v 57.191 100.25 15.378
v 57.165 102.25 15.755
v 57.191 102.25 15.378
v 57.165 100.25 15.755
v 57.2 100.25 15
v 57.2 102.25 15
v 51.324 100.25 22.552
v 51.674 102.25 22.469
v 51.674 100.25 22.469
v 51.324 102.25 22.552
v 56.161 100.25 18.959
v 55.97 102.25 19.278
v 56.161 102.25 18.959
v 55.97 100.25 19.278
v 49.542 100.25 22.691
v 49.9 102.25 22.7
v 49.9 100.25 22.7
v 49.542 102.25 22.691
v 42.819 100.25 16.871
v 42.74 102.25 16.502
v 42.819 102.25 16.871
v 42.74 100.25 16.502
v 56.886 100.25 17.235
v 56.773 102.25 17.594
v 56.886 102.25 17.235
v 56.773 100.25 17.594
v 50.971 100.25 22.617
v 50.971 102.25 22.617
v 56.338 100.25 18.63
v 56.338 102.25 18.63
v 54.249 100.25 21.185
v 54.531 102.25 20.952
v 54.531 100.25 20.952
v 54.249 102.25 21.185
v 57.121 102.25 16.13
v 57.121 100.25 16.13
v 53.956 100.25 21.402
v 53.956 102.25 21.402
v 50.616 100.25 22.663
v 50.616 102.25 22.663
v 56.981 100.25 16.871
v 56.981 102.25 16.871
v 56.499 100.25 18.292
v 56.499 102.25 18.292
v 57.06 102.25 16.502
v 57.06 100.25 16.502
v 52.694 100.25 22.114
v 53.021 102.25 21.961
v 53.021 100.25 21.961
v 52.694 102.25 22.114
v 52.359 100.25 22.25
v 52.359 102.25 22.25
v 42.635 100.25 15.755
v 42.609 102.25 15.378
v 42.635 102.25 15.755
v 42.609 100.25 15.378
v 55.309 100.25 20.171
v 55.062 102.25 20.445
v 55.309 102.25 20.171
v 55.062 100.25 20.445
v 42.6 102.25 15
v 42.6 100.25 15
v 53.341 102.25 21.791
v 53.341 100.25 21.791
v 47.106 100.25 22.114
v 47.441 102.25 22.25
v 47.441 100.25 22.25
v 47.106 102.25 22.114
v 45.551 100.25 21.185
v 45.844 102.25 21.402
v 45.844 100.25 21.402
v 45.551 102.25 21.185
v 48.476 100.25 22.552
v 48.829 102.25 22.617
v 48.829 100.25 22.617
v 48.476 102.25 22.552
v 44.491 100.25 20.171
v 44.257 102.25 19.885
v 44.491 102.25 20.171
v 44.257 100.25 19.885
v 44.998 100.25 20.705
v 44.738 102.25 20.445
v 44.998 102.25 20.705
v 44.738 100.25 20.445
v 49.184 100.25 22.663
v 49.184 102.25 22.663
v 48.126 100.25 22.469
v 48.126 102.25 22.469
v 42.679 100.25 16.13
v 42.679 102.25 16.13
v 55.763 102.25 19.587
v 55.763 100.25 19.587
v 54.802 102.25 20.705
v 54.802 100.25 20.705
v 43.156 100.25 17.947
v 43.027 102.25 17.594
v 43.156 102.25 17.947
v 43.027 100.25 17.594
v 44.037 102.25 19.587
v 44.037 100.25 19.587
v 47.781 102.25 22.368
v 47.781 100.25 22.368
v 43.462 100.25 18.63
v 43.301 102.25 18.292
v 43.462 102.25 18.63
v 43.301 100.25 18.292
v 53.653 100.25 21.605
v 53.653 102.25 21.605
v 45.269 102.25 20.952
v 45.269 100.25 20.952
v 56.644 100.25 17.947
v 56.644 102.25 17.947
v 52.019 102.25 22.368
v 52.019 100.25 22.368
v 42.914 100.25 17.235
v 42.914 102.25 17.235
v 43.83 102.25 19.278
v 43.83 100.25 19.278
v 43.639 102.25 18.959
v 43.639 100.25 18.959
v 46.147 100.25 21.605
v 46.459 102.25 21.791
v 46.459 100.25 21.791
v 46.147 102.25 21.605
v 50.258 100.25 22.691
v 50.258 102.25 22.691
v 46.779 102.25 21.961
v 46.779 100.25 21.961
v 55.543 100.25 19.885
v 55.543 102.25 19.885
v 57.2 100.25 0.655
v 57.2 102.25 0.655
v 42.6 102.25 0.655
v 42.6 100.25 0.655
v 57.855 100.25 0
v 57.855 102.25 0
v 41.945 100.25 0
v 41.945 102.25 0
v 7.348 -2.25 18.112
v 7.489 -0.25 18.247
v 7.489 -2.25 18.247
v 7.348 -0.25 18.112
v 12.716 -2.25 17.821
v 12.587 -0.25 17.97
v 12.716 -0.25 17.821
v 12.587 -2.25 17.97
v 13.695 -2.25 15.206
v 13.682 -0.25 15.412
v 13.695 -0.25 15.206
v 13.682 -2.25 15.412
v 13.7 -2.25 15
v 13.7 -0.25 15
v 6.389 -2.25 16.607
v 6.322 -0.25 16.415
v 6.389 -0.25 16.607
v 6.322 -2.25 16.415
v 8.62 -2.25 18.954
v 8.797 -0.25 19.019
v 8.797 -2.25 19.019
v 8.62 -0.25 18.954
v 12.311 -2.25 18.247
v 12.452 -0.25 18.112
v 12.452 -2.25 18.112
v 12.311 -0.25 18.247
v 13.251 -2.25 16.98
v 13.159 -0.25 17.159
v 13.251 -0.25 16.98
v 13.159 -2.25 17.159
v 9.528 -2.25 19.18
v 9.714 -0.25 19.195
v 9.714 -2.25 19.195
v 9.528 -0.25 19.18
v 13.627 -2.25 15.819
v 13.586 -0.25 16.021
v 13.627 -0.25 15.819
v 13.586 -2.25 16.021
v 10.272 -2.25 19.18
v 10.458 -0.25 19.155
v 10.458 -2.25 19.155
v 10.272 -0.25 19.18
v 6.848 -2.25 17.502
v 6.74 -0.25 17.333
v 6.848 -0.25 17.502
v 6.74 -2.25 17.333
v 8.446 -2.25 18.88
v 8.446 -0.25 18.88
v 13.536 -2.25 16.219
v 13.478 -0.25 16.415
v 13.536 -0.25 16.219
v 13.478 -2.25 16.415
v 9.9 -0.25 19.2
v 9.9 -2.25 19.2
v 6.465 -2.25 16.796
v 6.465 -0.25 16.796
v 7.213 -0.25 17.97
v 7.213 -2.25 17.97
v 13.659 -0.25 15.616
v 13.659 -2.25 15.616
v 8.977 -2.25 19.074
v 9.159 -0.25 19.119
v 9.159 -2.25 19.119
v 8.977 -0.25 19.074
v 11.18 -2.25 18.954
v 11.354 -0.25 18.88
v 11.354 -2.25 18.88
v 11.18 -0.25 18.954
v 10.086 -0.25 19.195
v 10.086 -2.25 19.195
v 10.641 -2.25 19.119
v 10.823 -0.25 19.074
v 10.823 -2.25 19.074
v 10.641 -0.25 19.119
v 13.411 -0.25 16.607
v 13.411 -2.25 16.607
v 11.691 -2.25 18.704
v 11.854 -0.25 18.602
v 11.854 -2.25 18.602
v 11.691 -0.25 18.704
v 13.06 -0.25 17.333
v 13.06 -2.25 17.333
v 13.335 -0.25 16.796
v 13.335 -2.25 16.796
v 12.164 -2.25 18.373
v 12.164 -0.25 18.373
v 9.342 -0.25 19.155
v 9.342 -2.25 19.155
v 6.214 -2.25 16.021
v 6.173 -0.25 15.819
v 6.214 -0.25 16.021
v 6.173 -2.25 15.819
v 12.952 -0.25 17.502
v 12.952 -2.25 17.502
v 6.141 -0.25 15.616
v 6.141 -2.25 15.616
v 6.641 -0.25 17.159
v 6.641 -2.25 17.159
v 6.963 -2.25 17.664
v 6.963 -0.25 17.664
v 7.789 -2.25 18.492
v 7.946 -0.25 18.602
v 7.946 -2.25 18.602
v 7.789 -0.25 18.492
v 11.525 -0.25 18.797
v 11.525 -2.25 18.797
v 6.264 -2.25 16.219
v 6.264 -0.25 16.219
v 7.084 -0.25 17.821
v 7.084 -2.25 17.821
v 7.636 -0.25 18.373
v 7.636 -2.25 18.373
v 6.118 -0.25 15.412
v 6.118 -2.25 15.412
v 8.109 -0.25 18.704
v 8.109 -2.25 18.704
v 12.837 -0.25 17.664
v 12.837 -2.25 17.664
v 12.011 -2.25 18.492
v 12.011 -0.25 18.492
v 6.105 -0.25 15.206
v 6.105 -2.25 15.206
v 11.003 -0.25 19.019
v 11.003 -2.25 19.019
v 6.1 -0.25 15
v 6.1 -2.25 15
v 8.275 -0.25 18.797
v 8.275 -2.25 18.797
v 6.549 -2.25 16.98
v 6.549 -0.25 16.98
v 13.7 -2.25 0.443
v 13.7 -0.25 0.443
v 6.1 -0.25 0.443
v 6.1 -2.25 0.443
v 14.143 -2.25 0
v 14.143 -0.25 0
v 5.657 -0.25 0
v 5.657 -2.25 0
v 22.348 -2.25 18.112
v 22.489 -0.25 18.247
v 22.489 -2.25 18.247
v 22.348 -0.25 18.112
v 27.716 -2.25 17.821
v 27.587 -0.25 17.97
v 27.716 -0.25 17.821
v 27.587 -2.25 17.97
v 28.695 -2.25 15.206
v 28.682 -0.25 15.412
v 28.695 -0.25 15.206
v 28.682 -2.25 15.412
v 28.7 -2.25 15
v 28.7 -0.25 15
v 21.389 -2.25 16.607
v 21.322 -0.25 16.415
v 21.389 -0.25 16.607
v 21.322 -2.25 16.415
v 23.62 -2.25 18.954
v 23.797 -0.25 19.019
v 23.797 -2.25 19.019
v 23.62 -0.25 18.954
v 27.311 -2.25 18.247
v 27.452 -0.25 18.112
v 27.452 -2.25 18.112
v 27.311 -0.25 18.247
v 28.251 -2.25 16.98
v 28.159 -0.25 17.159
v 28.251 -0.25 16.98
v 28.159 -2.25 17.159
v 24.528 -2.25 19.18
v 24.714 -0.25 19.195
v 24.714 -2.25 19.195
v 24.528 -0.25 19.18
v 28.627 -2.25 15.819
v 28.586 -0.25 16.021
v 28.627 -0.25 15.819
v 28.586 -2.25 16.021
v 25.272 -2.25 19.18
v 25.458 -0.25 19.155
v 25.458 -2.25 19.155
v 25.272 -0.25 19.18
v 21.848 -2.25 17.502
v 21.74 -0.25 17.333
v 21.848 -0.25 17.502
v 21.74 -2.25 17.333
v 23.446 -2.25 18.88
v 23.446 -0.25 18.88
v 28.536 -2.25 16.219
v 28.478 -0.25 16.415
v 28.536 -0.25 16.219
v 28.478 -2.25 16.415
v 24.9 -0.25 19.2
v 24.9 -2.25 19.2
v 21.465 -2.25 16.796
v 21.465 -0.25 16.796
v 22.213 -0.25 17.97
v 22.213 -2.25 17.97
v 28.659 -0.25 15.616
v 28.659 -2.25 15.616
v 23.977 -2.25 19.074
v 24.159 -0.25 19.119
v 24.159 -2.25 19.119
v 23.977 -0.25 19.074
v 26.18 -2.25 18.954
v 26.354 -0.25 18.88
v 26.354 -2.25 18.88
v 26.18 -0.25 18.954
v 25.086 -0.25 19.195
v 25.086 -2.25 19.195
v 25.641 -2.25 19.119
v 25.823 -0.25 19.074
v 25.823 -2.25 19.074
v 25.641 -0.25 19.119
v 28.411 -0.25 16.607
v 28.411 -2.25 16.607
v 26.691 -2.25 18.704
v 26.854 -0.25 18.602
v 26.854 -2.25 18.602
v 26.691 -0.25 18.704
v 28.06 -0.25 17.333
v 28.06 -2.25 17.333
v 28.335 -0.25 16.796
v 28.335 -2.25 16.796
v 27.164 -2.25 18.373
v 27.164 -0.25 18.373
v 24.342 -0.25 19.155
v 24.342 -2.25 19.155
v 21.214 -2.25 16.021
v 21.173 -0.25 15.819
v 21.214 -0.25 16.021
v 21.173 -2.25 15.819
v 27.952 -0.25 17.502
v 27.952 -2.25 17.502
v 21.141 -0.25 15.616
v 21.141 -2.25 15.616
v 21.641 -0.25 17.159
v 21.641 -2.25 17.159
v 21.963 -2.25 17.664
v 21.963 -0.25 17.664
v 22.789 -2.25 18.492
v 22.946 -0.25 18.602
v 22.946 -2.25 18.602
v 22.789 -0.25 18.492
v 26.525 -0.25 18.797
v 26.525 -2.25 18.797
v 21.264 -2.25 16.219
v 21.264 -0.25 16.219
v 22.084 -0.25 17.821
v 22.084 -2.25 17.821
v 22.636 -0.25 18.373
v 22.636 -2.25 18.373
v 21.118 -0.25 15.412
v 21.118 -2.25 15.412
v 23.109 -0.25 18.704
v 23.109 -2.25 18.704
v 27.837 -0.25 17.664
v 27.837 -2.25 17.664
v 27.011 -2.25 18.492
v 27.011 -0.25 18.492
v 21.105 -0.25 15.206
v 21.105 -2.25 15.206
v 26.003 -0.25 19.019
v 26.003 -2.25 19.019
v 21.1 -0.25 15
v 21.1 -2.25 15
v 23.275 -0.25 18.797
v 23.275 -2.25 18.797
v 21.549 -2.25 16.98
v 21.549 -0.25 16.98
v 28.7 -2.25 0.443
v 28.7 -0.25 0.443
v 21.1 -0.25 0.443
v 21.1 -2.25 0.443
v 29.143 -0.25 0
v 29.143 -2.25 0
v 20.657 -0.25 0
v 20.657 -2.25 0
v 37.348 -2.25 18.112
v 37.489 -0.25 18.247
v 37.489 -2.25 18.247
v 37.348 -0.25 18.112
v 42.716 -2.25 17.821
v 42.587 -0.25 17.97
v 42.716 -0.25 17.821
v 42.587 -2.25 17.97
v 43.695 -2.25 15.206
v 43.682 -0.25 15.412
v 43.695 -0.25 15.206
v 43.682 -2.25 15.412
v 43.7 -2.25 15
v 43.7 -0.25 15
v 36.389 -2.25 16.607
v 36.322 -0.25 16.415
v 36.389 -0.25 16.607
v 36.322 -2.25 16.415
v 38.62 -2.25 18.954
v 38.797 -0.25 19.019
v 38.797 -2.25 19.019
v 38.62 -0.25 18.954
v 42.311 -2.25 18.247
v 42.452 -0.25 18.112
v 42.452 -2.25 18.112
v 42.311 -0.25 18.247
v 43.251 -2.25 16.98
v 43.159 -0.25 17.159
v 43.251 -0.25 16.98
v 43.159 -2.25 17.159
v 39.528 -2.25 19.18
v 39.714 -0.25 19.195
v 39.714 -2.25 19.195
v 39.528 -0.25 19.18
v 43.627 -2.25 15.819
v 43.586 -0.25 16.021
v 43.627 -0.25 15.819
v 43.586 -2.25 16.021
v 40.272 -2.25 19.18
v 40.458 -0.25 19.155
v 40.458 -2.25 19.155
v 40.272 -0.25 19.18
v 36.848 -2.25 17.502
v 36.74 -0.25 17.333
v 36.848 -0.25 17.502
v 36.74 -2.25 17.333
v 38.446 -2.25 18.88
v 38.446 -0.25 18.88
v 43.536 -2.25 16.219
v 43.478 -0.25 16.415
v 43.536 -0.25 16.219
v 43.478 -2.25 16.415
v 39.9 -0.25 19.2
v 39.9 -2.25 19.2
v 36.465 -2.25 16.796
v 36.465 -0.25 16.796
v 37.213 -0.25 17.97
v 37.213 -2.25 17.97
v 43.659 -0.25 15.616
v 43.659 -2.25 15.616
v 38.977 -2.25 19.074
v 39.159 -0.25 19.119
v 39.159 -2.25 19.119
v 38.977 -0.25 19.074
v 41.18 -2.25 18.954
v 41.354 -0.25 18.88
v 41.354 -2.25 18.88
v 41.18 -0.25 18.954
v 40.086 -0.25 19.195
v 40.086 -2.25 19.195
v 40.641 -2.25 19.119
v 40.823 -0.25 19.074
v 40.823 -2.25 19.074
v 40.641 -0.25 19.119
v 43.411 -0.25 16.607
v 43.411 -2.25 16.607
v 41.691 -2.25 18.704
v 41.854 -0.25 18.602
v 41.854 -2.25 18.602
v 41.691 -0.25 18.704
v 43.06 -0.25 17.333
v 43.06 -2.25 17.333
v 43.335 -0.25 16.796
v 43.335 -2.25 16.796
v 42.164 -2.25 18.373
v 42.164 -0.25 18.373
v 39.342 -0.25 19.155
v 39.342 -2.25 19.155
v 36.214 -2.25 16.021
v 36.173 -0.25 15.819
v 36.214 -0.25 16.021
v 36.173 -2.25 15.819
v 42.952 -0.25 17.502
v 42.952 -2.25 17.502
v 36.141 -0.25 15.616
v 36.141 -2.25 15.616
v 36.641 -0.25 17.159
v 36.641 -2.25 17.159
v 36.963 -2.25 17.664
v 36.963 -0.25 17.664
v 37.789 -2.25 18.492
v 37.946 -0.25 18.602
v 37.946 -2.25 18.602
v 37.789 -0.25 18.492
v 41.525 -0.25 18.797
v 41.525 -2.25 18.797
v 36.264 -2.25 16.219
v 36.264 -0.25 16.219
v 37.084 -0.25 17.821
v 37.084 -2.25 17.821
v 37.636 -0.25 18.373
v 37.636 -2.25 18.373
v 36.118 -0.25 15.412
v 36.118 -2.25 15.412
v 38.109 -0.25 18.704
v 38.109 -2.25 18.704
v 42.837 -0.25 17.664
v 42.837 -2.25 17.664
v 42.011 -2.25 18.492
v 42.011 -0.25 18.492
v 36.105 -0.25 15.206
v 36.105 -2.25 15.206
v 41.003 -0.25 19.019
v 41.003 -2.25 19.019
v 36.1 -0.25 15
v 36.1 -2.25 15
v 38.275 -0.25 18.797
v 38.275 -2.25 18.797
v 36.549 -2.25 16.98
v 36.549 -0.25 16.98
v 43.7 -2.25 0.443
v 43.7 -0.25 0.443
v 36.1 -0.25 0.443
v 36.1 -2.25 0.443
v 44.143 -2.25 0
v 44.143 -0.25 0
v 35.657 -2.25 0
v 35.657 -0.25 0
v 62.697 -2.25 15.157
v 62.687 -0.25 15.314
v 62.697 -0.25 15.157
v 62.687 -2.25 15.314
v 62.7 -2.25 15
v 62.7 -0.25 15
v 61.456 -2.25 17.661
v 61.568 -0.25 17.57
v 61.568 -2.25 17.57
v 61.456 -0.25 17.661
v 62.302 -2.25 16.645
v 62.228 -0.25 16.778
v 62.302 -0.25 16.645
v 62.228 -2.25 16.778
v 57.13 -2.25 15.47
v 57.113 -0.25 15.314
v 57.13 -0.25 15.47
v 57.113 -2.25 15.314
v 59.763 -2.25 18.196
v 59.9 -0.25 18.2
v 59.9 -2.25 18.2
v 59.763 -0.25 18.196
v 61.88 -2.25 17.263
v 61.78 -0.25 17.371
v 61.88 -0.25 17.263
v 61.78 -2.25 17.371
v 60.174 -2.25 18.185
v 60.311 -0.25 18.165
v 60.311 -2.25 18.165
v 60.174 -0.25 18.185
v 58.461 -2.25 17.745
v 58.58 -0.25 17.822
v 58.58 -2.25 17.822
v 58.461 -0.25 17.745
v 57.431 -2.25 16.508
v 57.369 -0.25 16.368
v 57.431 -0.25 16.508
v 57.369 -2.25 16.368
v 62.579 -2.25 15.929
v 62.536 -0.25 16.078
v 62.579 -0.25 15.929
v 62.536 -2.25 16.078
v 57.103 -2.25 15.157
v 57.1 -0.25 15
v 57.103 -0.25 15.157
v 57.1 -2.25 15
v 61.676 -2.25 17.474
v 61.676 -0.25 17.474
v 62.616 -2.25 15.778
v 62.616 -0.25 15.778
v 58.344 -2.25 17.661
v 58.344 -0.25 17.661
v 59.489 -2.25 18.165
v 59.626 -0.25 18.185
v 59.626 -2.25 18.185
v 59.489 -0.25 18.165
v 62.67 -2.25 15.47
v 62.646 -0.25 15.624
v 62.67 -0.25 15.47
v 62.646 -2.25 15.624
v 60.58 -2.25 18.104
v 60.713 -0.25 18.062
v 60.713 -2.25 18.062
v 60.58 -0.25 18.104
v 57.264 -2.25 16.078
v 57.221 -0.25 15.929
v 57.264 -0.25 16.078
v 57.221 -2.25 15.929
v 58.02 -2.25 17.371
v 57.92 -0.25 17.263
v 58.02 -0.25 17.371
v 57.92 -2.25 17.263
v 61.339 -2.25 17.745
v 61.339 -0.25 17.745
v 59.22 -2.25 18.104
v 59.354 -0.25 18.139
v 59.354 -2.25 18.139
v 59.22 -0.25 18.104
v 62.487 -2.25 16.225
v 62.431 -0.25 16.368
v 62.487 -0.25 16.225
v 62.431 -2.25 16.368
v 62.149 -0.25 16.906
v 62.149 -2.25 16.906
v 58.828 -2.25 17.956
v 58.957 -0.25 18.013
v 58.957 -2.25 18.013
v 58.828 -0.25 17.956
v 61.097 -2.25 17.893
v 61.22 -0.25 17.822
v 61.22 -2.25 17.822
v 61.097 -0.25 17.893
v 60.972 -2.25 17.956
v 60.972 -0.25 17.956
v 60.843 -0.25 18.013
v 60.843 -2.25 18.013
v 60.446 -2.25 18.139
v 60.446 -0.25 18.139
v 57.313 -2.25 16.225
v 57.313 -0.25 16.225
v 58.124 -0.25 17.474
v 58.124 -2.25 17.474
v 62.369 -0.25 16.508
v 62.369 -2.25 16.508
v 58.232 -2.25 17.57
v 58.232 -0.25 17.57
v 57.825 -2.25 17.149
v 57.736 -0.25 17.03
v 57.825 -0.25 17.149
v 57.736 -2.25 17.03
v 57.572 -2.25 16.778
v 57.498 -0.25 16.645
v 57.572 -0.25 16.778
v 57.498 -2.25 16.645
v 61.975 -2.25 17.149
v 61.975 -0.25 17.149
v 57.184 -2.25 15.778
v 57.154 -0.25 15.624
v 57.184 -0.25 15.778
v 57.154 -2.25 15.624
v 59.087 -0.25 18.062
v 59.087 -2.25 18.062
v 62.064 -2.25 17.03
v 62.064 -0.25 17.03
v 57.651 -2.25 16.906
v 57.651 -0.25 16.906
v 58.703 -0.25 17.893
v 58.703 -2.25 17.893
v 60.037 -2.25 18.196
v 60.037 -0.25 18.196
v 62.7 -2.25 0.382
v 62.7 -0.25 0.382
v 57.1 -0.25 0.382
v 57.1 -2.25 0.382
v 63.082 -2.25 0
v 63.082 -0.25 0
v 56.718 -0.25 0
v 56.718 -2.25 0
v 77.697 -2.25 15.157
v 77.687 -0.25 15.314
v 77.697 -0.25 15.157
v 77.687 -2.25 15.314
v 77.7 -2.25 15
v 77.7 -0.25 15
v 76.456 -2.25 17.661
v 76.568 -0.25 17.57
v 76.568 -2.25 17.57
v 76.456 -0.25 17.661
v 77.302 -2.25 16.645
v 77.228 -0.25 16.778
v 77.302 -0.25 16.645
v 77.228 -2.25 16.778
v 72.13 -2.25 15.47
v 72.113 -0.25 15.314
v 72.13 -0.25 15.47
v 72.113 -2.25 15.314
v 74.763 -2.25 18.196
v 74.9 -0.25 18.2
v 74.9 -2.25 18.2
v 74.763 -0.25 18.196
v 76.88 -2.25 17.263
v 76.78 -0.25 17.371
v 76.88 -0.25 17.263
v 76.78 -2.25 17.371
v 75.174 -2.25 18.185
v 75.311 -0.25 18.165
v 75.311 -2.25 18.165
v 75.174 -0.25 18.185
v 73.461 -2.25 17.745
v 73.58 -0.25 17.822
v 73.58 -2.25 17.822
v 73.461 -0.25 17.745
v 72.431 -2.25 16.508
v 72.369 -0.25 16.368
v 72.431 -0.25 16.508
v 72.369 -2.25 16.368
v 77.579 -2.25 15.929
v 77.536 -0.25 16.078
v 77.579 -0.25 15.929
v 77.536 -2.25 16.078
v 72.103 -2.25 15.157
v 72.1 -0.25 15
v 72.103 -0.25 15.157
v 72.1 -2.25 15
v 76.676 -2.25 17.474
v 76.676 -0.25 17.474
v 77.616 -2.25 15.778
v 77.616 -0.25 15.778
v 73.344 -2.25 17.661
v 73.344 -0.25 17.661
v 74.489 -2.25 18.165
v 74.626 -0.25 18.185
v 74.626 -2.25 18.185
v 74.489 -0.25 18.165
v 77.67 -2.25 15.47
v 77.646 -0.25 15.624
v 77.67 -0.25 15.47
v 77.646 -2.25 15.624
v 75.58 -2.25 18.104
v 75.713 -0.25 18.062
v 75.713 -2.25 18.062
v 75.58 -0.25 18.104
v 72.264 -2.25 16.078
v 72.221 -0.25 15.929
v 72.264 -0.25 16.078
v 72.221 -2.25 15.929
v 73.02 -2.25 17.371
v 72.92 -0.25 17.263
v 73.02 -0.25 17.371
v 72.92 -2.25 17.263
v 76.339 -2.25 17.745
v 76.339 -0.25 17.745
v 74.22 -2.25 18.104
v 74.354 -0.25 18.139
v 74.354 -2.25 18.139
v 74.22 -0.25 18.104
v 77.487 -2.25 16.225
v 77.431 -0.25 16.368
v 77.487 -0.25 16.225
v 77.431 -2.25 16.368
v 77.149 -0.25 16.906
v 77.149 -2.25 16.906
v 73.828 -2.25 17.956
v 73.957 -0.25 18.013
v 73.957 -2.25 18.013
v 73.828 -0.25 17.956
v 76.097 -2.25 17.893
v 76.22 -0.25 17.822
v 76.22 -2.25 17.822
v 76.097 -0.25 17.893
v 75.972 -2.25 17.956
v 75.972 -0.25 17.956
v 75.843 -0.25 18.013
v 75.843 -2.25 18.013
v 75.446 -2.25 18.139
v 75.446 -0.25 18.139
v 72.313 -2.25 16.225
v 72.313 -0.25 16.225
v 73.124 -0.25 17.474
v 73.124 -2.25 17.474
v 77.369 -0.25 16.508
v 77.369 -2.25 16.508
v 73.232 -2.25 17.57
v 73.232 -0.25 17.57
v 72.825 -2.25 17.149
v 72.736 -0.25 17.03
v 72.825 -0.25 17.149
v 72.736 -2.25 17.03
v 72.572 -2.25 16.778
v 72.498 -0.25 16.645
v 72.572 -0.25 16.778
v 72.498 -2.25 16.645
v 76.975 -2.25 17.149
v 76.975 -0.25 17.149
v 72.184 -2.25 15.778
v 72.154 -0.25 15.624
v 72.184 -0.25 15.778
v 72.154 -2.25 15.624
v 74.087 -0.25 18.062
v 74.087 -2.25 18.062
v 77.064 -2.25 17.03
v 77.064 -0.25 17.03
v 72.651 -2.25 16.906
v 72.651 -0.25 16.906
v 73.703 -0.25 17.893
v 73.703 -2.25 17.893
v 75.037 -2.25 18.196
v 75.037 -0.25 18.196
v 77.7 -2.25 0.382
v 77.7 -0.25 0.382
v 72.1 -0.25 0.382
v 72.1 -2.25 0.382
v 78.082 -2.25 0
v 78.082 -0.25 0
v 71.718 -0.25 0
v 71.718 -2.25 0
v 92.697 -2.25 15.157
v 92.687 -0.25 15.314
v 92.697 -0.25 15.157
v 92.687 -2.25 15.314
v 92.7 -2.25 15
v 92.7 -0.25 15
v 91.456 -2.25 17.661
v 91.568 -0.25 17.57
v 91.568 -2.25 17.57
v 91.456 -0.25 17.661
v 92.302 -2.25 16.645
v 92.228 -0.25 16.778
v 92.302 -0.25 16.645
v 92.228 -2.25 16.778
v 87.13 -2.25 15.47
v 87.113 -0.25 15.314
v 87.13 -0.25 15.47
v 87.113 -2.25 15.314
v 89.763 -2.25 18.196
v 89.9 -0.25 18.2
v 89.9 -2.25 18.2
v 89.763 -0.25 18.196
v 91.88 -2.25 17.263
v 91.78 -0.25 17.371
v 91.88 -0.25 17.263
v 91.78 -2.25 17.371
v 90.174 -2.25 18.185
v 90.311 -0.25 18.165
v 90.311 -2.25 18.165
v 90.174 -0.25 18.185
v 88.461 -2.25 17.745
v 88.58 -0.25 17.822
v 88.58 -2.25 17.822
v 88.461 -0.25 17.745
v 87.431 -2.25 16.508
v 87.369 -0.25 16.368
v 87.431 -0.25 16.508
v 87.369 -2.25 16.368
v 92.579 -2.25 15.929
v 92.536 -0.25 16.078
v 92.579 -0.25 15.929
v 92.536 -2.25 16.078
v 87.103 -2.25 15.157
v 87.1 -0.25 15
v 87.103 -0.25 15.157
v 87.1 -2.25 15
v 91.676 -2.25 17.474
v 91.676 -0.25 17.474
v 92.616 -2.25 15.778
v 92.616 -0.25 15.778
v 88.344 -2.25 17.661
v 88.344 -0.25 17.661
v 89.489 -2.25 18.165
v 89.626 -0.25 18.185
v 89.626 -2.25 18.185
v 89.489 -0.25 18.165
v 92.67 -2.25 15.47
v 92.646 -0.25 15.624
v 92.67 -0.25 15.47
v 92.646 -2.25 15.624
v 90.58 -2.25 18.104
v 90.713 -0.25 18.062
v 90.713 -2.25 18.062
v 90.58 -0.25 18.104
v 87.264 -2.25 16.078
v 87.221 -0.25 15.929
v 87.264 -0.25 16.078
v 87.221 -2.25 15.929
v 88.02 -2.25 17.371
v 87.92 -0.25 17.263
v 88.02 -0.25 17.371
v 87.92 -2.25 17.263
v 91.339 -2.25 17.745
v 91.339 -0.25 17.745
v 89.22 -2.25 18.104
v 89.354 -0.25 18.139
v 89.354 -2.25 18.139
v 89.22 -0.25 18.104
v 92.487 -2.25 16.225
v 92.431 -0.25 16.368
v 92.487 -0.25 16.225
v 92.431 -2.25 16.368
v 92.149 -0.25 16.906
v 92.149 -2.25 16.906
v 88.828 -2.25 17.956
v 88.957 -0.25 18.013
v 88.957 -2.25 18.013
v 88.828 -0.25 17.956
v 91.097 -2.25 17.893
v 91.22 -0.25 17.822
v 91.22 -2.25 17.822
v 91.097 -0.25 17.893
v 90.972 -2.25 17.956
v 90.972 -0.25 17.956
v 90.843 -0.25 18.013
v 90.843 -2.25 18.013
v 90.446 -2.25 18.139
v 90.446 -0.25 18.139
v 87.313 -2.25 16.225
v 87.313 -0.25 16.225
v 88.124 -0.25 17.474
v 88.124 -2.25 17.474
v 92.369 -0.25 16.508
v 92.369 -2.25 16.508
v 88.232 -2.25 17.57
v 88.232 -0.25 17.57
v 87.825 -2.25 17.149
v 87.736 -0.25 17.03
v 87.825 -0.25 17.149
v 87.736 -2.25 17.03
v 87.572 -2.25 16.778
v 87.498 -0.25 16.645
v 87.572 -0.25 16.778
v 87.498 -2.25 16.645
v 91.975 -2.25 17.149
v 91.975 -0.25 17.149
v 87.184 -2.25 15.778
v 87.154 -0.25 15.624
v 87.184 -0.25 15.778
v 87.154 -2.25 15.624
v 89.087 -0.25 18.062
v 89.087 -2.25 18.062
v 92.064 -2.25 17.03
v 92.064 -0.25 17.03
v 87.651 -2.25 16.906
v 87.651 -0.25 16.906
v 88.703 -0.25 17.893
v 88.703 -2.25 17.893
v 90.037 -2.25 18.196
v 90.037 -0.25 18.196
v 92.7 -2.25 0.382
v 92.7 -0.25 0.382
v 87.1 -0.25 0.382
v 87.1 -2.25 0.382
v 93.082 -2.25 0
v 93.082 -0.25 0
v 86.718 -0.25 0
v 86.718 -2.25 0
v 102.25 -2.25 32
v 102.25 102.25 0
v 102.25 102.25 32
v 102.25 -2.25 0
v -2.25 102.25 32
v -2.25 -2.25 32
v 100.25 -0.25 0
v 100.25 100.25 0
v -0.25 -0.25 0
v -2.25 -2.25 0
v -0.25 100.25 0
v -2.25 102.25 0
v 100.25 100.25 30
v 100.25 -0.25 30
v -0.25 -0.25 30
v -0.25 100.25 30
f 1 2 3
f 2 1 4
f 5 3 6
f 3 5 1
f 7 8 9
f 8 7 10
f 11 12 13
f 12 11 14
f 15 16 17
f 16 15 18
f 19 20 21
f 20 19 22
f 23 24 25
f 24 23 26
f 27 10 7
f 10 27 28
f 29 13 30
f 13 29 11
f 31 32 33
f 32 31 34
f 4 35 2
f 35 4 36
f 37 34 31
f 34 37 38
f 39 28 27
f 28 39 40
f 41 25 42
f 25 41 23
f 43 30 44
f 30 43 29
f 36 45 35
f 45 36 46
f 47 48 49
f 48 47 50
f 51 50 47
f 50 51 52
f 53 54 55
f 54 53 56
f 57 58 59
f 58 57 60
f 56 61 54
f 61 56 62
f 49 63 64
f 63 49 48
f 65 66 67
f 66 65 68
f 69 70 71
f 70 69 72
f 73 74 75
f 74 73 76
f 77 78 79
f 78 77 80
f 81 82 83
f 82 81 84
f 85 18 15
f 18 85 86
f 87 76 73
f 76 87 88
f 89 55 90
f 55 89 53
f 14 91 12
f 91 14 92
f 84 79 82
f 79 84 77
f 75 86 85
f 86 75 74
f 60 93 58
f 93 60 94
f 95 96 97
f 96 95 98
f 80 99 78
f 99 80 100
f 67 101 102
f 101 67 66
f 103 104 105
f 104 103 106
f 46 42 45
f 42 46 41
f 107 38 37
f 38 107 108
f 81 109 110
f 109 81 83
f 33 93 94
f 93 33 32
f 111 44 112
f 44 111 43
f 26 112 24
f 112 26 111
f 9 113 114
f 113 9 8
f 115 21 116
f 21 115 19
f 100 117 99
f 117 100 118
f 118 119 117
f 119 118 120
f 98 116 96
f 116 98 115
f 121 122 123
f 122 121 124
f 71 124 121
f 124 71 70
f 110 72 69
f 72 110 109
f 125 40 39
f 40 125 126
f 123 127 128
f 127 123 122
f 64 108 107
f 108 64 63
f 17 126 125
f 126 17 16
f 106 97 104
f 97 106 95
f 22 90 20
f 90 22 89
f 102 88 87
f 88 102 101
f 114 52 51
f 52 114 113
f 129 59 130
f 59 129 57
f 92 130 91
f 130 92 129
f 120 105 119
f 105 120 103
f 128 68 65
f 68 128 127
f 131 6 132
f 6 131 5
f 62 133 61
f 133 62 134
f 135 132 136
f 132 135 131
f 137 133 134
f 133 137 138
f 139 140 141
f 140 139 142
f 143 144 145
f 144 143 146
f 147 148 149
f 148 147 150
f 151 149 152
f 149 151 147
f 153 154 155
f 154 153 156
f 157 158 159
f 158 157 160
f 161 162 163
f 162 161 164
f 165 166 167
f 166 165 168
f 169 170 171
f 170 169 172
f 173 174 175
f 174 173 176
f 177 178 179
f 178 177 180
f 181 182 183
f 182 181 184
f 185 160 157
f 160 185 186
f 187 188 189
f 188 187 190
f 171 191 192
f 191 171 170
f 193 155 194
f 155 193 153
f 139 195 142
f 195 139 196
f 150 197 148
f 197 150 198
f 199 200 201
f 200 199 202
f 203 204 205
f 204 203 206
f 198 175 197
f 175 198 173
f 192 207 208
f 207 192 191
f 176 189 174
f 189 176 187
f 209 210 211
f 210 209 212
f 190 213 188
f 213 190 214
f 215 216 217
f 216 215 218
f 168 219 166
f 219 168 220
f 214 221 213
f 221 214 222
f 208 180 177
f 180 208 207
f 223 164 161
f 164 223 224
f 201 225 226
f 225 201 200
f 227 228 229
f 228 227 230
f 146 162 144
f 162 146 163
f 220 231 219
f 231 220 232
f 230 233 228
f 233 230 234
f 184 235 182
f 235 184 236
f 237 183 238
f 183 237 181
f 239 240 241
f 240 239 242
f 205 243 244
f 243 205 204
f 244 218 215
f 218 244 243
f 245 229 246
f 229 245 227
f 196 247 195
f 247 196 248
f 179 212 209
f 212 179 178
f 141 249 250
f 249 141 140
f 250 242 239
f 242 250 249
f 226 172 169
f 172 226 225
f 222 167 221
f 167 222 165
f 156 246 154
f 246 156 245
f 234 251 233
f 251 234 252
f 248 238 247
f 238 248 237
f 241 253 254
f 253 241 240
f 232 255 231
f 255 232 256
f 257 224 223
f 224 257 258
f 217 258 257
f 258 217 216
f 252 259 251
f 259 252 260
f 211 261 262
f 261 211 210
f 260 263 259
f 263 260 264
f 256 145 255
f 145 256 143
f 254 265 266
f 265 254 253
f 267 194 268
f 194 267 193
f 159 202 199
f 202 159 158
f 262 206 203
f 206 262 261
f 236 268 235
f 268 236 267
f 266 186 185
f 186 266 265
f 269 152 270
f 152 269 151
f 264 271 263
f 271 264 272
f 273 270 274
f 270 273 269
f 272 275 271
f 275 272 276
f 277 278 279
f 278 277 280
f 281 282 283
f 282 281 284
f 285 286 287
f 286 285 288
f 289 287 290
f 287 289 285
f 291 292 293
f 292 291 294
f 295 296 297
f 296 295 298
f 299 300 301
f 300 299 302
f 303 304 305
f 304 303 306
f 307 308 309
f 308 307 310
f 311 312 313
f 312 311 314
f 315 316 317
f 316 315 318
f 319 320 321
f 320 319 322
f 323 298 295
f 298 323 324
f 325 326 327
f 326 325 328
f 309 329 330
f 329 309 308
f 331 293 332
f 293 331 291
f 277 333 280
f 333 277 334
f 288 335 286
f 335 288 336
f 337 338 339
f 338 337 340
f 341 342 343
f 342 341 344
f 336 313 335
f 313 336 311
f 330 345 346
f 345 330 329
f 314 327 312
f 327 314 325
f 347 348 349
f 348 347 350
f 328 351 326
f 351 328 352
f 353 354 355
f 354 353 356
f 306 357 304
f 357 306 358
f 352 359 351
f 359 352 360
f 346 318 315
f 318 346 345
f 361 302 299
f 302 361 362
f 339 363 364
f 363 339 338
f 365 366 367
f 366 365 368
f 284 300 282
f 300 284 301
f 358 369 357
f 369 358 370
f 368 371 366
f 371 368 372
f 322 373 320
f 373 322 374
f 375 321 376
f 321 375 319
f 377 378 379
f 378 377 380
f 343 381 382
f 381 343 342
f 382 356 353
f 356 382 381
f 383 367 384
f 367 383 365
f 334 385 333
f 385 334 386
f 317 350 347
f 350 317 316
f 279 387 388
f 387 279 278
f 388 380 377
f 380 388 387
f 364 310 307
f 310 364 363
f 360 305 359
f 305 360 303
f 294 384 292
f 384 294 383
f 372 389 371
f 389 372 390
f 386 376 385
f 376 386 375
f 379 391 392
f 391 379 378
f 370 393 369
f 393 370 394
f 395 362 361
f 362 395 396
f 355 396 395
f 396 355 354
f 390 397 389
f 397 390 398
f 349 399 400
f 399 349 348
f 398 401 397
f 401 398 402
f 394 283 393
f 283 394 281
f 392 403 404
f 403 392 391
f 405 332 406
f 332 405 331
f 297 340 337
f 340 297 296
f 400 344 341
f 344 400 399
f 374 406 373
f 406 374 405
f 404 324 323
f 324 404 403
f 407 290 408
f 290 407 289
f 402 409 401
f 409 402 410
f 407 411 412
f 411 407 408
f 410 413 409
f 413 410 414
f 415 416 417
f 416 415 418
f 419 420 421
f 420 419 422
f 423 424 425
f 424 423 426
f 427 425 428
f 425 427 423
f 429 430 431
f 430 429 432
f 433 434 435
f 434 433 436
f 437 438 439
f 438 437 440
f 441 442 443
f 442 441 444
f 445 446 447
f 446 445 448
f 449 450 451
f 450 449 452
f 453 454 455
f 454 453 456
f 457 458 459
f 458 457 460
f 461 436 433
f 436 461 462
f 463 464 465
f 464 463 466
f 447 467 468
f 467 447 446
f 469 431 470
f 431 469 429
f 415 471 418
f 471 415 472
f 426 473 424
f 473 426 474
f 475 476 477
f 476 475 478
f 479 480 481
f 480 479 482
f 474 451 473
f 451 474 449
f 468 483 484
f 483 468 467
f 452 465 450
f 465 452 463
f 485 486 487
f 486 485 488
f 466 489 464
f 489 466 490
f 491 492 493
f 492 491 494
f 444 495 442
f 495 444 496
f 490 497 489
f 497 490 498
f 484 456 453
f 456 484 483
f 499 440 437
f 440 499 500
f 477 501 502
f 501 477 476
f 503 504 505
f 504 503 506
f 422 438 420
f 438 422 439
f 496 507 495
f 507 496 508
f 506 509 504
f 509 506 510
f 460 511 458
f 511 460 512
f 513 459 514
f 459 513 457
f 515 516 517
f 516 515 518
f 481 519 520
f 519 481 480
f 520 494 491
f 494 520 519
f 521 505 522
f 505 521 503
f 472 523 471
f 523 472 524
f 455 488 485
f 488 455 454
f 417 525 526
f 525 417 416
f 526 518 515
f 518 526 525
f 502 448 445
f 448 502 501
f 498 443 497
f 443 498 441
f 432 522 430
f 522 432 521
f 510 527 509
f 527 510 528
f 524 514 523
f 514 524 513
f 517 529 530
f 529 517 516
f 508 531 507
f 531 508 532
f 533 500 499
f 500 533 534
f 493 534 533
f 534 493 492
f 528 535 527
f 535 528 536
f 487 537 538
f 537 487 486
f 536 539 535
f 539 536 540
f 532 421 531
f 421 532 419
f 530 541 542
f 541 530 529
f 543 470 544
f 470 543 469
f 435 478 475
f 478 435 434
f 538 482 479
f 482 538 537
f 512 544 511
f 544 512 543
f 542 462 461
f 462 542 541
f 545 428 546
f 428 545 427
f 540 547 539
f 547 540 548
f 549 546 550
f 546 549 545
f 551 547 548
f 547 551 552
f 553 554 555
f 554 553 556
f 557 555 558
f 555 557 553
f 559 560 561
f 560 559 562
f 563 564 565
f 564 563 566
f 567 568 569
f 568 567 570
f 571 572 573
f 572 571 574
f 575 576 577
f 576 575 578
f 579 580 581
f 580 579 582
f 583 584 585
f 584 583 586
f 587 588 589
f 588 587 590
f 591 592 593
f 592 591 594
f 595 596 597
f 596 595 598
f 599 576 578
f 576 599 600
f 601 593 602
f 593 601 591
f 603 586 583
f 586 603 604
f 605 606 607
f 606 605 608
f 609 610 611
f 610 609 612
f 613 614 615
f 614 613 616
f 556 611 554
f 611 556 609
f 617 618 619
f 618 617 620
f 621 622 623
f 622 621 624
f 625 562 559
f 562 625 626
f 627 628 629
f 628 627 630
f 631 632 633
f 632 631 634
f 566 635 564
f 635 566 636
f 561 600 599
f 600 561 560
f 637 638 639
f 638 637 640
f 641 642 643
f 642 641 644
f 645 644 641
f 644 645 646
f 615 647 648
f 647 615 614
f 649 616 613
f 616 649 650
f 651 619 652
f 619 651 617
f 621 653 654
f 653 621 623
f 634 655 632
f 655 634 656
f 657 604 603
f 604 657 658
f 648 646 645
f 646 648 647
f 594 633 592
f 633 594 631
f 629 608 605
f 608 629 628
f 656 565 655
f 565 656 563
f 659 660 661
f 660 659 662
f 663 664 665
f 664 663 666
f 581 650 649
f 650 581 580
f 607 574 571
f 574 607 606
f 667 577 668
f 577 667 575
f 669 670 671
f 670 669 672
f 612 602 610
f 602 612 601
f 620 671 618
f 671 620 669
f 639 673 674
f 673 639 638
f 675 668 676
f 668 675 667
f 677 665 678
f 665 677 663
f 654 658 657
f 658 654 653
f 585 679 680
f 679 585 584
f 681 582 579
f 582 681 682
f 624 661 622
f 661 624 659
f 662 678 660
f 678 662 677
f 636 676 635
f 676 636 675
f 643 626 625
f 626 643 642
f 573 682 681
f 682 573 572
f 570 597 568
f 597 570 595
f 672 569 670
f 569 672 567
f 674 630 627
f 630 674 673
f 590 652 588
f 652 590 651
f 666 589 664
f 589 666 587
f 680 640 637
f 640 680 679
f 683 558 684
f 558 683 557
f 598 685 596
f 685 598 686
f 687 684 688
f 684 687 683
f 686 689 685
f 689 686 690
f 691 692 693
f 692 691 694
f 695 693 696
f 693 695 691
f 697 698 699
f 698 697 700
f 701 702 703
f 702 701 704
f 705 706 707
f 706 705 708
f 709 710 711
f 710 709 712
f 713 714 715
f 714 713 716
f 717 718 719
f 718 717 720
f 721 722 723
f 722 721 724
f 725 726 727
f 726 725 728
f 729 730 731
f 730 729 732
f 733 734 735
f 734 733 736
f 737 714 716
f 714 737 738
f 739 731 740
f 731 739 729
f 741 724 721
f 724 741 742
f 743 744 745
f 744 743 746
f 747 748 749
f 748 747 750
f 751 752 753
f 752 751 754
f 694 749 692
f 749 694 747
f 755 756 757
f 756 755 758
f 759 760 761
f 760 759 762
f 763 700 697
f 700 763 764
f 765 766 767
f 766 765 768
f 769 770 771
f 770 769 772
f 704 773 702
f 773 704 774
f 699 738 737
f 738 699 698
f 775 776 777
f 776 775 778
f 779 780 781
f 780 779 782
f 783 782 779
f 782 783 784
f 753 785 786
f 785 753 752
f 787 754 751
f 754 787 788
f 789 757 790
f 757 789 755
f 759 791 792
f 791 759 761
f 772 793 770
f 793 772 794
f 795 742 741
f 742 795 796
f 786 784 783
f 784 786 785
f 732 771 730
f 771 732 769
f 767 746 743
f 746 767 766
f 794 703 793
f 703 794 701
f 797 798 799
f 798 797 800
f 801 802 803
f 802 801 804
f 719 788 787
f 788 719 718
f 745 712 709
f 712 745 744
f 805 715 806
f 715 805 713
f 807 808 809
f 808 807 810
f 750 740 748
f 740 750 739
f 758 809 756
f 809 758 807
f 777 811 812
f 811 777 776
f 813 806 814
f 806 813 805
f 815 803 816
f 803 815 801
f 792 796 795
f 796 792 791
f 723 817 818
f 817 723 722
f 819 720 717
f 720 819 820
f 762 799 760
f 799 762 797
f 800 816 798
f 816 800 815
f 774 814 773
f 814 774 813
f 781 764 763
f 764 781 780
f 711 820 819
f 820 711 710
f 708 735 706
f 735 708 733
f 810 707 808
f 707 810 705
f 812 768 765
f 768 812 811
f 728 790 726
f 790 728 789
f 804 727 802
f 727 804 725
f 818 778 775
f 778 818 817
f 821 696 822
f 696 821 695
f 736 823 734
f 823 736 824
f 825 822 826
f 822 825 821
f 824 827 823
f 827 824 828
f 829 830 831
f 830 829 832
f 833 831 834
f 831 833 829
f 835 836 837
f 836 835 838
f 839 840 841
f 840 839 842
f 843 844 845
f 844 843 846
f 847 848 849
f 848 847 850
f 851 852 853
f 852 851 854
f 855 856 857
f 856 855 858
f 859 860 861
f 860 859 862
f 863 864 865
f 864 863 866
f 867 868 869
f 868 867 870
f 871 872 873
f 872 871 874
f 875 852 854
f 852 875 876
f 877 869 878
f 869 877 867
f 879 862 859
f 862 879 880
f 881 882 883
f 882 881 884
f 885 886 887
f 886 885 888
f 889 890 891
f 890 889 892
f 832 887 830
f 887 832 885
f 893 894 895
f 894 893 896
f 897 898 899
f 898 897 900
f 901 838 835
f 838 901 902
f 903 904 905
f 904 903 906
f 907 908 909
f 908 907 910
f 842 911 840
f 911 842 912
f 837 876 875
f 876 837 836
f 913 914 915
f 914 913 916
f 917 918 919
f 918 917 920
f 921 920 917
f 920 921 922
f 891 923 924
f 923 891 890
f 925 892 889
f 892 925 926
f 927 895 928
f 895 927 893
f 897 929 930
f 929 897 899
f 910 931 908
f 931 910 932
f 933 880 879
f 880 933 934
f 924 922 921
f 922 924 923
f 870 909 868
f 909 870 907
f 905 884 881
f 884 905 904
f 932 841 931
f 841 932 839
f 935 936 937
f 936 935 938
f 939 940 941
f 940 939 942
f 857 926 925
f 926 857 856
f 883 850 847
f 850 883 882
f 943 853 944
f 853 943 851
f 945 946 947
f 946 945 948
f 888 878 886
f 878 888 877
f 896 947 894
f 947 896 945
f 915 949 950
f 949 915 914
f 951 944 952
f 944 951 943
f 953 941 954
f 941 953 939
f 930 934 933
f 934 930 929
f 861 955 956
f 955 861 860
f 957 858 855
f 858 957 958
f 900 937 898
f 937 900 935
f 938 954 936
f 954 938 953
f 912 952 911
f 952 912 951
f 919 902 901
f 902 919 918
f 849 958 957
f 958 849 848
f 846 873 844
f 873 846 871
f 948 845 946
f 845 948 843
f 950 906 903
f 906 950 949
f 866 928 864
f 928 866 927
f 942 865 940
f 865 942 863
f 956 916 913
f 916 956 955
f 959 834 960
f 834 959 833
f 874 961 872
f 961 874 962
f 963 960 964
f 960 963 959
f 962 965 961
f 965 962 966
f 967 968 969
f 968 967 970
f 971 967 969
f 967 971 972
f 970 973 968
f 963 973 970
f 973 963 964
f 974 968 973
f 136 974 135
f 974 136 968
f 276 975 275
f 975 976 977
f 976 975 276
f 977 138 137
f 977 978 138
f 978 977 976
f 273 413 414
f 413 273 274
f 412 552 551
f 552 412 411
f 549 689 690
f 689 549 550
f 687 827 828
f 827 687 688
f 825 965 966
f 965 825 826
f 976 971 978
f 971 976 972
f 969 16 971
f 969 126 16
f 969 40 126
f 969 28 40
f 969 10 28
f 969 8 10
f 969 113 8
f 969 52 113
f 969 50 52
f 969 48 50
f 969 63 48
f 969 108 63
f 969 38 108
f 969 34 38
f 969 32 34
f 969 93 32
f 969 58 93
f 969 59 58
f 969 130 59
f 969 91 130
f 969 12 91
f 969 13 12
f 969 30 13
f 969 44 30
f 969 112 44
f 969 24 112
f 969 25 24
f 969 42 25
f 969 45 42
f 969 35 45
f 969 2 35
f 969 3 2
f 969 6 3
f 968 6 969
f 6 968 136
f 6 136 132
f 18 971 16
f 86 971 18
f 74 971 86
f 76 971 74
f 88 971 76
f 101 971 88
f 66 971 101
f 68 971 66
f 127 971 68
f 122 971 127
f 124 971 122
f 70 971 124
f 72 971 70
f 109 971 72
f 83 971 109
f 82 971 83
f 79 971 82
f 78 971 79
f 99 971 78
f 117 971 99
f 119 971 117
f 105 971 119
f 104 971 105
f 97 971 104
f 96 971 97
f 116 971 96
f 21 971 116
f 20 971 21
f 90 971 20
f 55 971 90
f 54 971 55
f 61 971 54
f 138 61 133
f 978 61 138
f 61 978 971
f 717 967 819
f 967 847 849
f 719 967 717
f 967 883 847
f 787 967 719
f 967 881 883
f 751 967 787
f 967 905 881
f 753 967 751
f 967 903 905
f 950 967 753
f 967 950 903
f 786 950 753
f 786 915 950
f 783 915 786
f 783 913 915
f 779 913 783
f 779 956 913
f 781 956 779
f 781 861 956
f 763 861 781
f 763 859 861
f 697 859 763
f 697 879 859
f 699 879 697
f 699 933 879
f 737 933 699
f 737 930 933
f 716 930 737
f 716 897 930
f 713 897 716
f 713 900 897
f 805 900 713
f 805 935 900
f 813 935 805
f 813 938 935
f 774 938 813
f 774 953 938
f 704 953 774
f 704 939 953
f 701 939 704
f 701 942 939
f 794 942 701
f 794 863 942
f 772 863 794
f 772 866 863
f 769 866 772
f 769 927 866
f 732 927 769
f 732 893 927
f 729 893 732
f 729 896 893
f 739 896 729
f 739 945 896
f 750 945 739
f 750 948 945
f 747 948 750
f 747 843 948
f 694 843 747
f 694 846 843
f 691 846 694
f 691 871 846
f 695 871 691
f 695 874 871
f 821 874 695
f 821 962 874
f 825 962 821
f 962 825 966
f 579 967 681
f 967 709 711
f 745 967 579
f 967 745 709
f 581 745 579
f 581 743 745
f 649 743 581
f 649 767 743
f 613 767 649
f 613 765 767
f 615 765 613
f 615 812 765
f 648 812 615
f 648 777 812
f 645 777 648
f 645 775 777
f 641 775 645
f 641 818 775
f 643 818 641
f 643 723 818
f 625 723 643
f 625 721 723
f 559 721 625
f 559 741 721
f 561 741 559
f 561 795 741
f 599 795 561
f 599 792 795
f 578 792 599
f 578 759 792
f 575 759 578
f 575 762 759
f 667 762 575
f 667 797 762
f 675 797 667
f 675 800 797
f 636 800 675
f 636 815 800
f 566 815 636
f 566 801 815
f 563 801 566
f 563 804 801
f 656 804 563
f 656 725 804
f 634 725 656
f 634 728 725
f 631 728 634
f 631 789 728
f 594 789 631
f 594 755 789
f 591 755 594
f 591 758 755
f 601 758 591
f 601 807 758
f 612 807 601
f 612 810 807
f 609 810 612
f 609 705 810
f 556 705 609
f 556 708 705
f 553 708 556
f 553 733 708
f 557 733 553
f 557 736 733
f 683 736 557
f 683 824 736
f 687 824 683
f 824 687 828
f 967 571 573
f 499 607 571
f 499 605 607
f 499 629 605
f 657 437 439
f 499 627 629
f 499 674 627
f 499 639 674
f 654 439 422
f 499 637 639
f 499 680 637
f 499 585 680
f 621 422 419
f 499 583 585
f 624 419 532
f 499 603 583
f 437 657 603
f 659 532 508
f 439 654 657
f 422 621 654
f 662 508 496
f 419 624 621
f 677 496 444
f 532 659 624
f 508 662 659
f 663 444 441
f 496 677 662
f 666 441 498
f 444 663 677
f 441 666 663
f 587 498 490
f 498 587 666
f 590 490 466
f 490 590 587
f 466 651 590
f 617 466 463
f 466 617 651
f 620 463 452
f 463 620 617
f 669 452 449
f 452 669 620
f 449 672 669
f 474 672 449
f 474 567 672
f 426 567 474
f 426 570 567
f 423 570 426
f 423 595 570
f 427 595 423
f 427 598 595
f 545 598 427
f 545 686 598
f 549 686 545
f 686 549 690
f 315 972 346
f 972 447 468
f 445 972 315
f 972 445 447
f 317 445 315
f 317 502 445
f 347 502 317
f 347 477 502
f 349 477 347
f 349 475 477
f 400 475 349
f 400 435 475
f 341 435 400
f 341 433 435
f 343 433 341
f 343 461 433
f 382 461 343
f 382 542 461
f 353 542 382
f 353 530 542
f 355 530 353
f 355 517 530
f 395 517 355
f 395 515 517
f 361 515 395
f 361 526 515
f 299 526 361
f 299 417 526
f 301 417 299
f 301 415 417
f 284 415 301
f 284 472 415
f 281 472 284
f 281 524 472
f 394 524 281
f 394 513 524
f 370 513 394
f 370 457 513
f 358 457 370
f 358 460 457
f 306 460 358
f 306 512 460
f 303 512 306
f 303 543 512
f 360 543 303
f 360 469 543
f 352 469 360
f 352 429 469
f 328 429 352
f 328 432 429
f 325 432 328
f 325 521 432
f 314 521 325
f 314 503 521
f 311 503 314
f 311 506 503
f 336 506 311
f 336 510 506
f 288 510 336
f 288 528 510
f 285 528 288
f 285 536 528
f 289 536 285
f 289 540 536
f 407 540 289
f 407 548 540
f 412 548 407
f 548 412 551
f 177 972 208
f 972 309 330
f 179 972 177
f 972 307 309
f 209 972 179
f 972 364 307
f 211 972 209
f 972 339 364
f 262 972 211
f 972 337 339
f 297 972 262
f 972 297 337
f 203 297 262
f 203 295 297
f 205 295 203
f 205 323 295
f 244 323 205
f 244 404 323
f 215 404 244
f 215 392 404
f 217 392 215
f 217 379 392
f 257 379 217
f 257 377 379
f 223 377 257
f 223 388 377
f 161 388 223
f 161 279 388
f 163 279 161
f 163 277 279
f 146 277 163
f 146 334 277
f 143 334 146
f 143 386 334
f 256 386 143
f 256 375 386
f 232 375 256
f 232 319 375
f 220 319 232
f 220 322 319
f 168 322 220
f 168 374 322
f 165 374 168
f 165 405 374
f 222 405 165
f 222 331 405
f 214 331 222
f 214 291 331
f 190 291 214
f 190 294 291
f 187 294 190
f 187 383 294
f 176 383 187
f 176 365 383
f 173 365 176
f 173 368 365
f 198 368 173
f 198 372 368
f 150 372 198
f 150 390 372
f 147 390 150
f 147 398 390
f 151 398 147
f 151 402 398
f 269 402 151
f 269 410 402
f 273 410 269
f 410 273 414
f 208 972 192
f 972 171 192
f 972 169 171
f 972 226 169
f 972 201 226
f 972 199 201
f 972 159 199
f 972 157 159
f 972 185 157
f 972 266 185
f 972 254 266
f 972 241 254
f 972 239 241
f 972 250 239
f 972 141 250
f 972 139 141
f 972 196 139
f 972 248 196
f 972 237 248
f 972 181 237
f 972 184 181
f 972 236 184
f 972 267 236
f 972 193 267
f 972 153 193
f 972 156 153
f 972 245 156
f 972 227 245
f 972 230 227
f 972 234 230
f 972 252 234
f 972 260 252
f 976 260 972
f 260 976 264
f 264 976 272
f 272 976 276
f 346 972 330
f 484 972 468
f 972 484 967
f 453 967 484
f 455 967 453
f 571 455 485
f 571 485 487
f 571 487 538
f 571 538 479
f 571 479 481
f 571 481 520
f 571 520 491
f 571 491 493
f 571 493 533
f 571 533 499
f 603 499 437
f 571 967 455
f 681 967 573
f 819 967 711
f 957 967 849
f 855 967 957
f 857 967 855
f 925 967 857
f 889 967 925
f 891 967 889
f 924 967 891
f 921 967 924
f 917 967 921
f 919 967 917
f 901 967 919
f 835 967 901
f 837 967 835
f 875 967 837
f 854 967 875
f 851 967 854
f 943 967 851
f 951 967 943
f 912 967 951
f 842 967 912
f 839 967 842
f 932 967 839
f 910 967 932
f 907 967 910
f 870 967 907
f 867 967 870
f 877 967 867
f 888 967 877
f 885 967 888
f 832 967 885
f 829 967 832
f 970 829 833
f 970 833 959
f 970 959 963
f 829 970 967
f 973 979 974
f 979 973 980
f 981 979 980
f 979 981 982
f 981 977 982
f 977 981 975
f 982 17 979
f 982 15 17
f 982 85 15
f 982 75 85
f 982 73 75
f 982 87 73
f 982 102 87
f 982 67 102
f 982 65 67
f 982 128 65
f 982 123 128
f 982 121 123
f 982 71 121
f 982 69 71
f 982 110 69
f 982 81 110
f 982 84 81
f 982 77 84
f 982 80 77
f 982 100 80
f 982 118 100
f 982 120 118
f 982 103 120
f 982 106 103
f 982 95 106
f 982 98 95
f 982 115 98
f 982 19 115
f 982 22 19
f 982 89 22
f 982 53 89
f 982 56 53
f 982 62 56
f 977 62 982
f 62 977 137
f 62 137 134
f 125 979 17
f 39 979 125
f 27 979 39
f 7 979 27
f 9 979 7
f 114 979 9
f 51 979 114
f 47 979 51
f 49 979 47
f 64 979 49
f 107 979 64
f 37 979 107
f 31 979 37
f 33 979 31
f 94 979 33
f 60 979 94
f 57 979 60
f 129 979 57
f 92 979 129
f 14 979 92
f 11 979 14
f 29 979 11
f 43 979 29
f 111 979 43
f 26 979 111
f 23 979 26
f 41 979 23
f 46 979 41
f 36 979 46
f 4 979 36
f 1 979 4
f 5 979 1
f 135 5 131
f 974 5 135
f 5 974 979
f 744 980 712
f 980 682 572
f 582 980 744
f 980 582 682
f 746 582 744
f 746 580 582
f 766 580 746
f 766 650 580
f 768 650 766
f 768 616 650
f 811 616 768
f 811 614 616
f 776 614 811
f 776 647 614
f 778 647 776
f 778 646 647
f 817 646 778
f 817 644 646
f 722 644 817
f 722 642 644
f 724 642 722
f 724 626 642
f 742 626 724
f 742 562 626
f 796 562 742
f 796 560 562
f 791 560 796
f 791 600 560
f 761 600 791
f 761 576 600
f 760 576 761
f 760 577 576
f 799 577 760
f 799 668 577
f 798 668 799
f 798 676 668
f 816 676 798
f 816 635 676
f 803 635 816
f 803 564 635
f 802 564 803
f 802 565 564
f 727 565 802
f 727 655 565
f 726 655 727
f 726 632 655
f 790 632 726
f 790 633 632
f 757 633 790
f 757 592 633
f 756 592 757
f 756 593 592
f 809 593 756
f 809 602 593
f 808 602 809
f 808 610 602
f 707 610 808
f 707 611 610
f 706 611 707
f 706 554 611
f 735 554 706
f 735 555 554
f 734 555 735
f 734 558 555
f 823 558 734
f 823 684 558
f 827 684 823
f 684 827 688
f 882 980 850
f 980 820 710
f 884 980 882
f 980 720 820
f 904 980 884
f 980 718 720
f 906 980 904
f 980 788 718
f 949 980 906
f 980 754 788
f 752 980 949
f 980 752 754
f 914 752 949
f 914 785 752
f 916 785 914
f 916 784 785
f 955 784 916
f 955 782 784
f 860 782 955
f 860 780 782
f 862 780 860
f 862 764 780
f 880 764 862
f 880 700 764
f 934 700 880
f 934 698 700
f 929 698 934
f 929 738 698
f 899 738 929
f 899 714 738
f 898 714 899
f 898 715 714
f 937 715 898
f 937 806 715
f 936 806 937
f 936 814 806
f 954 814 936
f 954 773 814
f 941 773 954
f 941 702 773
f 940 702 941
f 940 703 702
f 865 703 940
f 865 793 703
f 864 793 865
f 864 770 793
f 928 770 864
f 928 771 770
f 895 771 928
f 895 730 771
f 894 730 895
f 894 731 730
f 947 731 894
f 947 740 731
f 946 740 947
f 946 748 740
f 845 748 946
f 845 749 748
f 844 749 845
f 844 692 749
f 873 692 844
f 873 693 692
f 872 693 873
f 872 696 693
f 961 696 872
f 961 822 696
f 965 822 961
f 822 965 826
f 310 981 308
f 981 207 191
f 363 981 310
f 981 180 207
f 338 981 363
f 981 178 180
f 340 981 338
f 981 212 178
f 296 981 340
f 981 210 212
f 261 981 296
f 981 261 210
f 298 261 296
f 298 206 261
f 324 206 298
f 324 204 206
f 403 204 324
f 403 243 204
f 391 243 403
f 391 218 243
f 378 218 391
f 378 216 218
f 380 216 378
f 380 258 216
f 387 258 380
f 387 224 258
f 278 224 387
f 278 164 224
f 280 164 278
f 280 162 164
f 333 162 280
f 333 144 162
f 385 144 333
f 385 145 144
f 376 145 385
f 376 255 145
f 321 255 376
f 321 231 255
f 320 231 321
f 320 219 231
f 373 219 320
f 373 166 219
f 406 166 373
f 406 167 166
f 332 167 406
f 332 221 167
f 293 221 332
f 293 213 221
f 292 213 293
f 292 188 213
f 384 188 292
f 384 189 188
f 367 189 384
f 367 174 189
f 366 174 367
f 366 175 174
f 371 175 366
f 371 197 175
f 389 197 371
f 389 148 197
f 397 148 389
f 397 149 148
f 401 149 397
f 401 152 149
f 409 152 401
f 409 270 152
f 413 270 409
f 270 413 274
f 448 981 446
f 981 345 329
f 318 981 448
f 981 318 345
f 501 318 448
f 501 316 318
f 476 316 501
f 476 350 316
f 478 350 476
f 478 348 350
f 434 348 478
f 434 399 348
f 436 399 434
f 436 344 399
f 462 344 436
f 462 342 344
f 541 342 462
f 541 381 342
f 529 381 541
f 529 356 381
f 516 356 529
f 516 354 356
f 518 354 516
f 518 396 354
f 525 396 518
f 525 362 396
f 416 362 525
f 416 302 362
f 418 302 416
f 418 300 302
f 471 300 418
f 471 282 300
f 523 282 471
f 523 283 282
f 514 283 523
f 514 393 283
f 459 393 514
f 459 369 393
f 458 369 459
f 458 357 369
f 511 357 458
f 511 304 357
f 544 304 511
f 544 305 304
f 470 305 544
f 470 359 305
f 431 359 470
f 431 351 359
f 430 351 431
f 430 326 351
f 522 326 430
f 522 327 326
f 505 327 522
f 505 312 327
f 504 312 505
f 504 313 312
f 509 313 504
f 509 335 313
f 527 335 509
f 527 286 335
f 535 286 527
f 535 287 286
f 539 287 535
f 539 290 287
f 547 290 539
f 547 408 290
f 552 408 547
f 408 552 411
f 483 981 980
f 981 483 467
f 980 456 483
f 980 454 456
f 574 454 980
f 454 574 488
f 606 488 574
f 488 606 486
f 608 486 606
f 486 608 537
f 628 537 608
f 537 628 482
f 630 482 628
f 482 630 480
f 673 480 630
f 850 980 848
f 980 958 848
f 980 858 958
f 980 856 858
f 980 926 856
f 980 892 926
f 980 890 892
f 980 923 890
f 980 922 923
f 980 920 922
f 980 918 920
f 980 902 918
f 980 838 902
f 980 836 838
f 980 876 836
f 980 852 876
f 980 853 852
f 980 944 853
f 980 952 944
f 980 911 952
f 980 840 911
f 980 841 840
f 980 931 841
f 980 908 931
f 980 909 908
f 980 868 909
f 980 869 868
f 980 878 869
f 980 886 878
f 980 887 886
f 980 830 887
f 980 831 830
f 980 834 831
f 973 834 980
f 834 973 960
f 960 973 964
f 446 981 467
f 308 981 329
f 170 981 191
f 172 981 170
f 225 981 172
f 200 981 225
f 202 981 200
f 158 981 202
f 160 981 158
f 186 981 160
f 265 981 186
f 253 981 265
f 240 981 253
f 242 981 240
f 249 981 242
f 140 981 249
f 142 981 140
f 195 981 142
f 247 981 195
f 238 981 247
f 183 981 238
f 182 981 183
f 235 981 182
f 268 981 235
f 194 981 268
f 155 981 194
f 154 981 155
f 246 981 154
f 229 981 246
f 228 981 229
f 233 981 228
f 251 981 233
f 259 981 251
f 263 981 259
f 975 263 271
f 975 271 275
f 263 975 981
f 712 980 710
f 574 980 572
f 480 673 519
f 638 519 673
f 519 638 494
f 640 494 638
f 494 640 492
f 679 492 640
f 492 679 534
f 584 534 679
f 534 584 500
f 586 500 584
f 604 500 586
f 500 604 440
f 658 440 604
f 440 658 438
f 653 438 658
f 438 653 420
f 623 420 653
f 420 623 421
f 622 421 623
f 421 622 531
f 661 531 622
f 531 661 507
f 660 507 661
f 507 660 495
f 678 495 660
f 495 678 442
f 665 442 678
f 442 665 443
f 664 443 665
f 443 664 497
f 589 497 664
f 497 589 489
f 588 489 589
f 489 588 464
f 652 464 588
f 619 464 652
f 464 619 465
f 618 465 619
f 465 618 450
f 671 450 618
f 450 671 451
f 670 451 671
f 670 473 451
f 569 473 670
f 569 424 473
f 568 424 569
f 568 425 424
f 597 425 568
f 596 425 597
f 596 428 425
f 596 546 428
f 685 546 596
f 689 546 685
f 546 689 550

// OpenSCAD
$fn = 128;

sizeX = 100;
sizeY = 100;
sizeZ = 30;

module cutout(size, delta, side) {
    // hole
    rotate([90, 0, 0])
    scale([(size - delta)/size, (size+delta)/size, 1])
    cylinder(10, d=size, center=true);

    // cutout
    translate([0, 0, 10*side])
    cube([size-delta, 10, 20], center=true);

    // chamfer
    translate([0, 0, sizeZ*0.5*side])
    rotate([0, 45, 0])
    cube([size*0.75, 10, size*0.75], center=true);
}

module cables(side) {
    // one cable at upper side
    translate([50, sizeY, 15]) {
        cutout(15, 0.4, side);
    }

    // two times three cables at lower side
    for (i = [10, 25, 40]) {
        translate([i, 0, 15]) {
            cutout(8, 0.4, side);
        }
    }
    for (i = [60, 75, 90]) {
        translate([i, 0, 15]) {
            cutout(6, 0.4, side);
        }
    }
}


module lower() {
    difference() {
        // box
        cube([sizeX, sizeY, sizeZ]);

        // make hollow
        translate([2, 2, 2])
        cube([sizeX - 4, sizeY - 4, sizeZ]);  

        // cable cutouts shifted by 0.1mm
        translate([0.1, 0, 0])
        cables(1);
    }
}

module upper() {
    difference() {
        // box
        translate([-2.25, -2.25, 0])
        cube([sizeX + 4.5, sizeY + 4.5, sizeZ + 2]);

        // make hollow
        translate([-0.25, -0.25, -2])
        cube([sizeX + 0.5, sizeY + 0.5, sizeZ + 2]);
        
        // cable cutouts shifted by 0.1mm
        translate([-0.1, 0, 0])
        cables(-1);
    }
}


/*
difference() {
    union() {
        lower();
        //translate([0, 0, 1])
        upper();
    }
    
    cube([80, 80, 80], center=true);
}*/


//lower();
upper();
